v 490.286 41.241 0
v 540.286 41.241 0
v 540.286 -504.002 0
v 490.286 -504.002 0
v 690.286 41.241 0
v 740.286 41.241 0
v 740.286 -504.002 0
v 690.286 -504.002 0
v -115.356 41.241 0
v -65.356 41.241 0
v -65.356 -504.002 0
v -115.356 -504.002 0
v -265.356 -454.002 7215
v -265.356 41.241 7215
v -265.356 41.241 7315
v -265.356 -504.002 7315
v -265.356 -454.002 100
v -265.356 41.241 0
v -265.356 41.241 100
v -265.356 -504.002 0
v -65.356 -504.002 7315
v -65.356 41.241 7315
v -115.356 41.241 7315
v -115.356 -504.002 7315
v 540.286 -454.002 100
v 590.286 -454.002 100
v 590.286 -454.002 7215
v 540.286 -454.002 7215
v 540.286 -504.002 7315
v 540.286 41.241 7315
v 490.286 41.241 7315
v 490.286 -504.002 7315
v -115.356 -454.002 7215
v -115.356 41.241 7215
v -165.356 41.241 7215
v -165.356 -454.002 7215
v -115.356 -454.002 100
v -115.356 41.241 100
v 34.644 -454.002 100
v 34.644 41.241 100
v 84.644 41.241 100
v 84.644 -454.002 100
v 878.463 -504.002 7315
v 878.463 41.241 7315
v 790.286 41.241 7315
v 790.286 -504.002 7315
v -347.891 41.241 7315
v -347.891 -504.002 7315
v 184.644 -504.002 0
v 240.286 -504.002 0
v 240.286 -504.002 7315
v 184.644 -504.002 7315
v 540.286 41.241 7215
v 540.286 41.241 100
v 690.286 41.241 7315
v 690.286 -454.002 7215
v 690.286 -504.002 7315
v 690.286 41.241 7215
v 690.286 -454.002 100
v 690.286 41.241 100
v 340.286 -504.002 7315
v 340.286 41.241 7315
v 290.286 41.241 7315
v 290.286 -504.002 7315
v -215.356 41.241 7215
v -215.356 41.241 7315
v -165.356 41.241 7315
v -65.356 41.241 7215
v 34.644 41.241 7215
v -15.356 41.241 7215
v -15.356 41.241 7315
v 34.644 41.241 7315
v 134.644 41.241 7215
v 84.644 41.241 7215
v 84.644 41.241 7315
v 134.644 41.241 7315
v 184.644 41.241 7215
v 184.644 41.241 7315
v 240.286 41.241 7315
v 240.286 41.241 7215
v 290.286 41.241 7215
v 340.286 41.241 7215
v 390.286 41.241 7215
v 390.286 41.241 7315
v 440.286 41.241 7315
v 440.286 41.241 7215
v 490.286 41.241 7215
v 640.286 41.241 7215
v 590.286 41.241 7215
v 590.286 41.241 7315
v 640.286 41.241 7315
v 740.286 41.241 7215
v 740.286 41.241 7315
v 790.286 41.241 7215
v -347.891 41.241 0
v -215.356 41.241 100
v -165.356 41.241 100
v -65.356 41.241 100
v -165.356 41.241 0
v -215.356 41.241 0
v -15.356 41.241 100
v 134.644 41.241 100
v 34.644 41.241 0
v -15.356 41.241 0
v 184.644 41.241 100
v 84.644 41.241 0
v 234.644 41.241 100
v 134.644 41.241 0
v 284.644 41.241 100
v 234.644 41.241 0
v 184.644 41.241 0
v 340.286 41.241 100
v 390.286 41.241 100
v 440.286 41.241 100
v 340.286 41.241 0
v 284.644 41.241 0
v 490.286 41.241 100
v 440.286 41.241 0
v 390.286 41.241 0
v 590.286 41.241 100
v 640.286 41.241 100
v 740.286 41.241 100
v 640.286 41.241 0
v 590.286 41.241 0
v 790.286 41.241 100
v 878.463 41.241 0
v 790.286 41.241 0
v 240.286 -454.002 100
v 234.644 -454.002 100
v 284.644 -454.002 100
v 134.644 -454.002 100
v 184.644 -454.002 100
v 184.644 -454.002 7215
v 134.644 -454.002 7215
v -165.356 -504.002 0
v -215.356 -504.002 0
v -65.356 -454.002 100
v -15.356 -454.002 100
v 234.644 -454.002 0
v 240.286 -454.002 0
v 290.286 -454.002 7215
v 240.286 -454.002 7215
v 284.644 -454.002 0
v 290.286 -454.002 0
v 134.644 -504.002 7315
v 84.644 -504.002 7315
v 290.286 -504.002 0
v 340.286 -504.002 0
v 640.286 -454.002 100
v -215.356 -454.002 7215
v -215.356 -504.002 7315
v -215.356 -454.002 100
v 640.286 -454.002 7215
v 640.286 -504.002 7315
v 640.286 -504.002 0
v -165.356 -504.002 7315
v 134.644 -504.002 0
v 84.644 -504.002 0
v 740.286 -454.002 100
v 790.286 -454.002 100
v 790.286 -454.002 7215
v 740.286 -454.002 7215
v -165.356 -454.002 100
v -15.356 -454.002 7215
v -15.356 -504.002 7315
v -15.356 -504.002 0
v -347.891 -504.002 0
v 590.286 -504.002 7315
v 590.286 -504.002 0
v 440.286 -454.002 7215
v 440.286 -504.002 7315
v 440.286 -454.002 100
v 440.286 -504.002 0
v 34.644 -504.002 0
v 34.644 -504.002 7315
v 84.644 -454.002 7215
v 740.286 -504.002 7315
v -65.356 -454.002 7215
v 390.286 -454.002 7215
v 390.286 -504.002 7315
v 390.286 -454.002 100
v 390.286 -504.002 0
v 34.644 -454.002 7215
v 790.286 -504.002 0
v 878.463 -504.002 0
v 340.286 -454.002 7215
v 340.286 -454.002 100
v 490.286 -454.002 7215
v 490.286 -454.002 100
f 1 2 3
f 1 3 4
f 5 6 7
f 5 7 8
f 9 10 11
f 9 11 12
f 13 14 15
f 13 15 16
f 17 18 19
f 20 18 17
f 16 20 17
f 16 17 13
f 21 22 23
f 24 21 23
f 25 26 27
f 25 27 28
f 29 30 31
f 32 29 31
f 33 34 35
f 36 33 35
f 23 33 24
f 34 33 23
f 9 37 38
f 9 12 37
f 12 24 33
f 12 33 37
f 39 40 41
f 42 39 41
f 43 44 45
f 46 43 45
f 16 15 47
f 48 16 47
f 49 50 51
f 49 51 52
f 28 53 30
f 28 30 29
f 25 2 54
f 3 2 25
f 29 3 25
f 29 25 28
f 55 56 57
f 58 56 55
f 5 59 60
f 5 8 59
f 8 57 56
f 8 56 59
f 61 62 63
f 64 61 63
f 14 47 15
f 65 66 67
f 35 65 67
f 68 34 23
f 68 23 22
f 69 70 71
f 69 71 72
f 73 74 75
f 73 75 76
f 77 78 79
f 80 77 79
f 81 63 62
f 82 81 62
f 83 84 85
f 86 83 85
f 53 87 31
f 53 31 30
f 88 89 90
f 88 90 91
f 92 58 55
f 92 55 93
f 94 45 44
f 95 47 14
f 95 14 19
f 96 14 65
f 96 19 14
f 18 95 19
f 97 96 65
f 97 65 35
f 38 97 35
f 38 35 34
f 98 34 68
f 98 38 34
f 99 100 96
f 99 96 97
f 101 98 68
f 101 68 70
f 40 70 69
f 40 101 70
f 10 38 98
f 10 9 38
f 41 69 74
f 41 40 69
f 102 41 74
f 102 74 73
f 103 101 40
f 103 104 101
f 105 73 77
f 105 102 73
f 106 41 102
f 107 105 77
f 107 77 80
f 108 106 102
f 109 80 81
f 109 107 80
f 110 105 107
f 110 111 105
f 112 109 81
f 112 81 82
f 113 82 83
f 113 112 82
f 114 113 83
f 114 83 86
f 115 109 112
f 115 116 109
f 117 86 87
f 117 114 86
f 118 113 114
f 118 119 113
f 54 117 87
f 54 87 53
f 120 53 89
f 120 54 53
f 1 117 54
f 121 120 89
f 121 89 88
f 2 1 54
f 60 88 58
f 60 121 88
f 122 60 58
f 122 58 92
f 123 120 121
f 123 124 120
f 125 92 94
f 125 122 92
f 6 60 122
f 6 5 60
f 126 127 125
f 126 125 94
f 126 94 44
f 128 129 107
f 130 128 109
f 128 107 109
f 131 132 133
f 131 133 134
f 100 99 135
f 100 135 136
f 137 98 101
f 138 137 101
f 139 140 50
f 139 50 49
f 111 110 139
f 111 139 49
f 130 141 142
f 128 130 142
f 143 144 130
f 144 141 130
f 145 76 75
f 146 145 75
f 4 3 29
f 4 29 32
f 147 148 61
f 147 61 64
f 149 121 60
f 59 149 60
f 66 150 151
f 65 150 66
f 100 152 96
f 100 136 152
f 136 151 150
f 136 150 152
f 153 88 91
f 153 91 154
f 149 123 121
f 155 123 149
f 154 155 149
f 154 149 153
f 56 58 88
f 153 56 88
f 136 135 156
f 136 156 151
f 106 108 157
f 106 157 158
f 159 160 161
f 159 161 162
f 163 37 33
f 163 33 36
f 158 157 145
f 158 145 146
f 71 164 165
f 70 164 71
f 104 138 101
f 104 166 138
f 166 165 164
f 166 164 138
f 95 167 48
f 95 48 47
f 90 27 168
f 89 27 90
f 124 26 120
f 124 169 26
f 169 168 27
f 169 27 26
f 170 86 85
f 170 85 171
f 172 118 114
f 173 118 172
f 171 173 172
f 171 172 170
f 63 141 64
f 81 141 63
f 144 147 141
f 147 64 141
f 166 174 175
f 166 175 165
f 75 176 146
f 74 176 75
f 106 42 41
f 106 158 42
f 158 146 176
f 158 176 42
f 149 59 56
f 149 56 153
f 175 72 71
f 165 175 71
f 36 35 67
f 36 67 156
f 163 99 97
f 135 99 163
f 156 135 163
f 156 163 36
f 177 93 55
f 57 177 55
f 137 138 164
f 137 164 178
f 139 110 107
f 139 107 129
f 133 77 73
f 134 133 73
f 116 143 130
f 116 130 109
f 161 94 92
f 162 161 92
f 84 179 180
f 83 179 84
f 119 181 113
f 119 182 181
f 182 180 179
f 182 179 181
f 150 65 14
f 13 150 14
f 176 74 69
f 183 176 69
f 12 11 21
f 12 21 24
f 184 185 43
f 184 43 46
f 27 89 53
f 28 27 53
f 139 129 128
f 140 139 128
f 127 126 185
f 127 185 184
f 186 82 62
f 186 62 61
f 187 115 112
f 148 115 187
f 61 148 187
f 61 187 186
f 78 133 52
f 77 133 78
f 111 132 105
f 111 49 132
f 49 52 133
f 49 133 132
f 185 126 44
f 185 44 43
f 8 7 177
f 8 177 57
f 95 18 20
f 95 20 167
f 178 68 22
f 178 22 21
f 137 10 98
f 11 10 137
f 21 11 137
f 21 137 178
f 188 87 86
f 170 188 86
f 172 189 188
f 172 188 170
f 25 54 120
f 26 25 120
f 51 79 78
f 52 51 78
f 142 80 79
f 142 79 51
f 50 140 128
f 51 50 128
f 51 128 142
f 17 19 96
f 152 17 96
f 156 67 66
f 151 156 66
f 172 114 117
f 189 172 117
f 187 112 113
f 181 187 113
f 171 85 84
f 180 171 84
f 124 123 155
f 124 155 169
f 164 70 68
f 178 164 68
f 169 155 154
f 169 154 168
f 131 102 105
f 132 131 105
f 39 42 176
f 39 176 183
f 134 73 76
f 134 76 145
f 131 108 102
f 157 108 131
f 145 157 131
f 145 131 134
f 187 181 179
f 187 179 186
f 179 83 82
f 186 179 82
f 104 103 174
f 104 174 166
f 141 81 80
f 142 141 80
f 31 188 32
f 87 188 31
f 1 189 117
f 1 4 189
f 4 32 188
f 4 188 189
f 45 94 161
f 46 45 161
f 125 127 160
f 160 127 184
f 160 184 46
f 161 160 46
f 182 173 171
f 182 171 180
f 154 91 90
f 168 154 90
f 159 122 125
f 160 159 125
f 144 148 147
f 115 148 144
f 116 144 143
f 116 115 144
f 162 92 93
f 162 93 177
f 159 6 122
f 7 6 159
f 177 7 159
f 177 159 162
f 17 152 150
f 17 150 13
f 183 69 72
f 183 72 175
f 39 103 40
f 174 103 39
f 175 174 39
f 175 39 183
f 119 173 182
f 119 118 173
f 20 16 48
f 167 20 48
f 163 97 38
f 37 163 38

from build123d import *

# Parameters (mm, degrees)
BOSS_EXTRUDE1_DEPTH = 7315
CUT_EXTRUDE1_DEPTH  = 100
CUT_EXTRUDE2_DEPTH  = 100


with BuildPart() as part:
    # Sketch1 → Boss-Extrude1 (new body)
    with BuildSketch(Plane.XY):
        Polygon((390.286155145, -454.00220839), (340.286155145, -454.00220839), (340.286155145, -504.00220839), (290.286155145, -504.00220839), (290.286155145, -454.00220839), (240.286155145, -454.00220839), (240.286155145, -504.00220839), (184.64446635, -504.00220839), (184.64446635, -454.00220839), (134.64446635, -454.00220839), (134.64446635, -504.00220839), (84.64446635, -504.00220839), (84.64446635, -454.00220839), (34.64446635, -454.00220839), (34.64446635, -504.00220839), (-15.35553365, -504.00220839), (-15.35553365, -454.00220839), (-65.35553365, -454.00220839), (-65.35553365, -504.00220839), (-115.35553365, -504.00220839), (-115.35553365, -454.00220839), (-165.35553365, -454.00220839), (-165.35553365, -504.00220839), (-215.35553365, -504.00220839), (-215.35553365, -454.00220839), (-265.35553365, -454.00220839), (-265.35553365, -504.00220839), (-347.890991568, -504.00220839), (-347.890991568, 41.240606266), (878.463301858, 41.240606266), (878.463301858, -504.00220839), (790.286155145, -504.00220839), (790.286155145, -454.00220839), (740.286155145, -454.00220839), (740.286155145, -504.00220839), (690.286155145, -504.00220839), (690.286155145, -454.00220839), (640.286155145, -454.00220839), (640.286155145, -504.00220839), (590.286155145, -504.00220839), (590.286155145, -454.00220839), (540.286155145, -454.00220839), (540.286155145, -504.00220839), (490.286155145, -504.00220839), (490.286155145, -454.00220839), (440.286155145, -454.00220839), (440.286155145, -504.00220839), (390.286155145, -504.00220839), align=None)
    extrude(amount=BOSS_EXTRUDE1_DEPTH)

    # Sketch2 → Cut-Extrude1 (cut)
    with BuildSketch(Plane.XY.offset(7315)):
        Polygon((-265.35553365, -454.00220839), (-265.35553365, 201.707253547), (-265.35553365, 367.434180801), (790.286155145, 367.434180801), (790.286155145, -454.00220839), (740.286155145, -454.00220839), (740.286155145, 201.707253547), (690.286155145, 201.707253547), (690.286155145, -454.00220839), (640.286155145, -454.00220839), (640.286155145, 201.707253547), (590.286155145, 201.707253547), (590.286155145, -454.00220839), (540.286155145, -454.00220839), (540.286155145, 201.707253547), (490.286155145, 201.707253547), (490.286155145, -454.00220839), (440.286155145, -454.00220839), (440.286155145, 201.707253547), (390.286155145, 201.707253547), (390.286155145, -454.00220839), (340.286155145, -454.00220839), (340.286155145, 201.707253547), (290.286155145, 201.707253547), (290.286155145, -454.00220839), (240.286155145, -454.00220839), (240.286155145, 201.707253547), (184.64446635, 201.707253547), (184.64446635, -454.00220839), (134.64446635, -454.00220839), (134.64446635, 201.707253547), (84.64446635, 201.707253547), (84.64446635, -454.00220839), (34.64446635, -454.00220839), (34.64446635, 201.707253547), (-15.35553365, 201.707253547), (-15.35553365, -454.00220839), (-65.35553365, -454.00220839), (-65.35553365, 201.707253547), (-115.35553365, 201.707253547), (-115.35553365, -454.00220839), (-165.35553365, -454.00220839), (-165.35553365, 201.707253547), (-215.35553365, 201.707253547), (-215.35553365, -454.00220839), align=None)
    extrude(amount=-CUT_EXTRUDE1_DEPTH, mode=Mode.SUBTRACT)

    # Sketch3 → Cut-Extrude2 (cut)
    with BuildSketch(Plane(origin=(0, 0, 0), x_dir=(-1, 0, 0), z_dir=(0, 0, -1))):
        Polygon((-790.286155145, -454.00220839), (-790.286155145, 201.707253547), (-790.286155145, 367.434180801), (265.35553365, 367.434180801), (265.35553365, -454.00220839), (215.35553365, -454.00220839), (215.35553365, 201.707253547), (165.35553365, 201.707253547), (165.35553365, -454.00220839), (115.35553365, -454.00220839), (115.35553365, 201.707253547), (65.35553365, 201.707253547), (65.35553365, -454.00220839), (15.35553365, -454.00220839), (15.35553365, 201.707253547), (-34.64446635, 201.707253547), (-34.64446635, -454.00220839), (-84.64446635, -454.00220839), (-84.64446635, 201.707253547), (-134.64446635, 201.707253547), (-134.64446635, -454.00220839), (-184.64446635, -454.00220839), (-184.64446635, 201.707253547), (-234.64446635, 201.707253547), (-234.64446635, -454.00220839), (-284.64446635, -454.00220839), (-284.64446635, 201.707253547), (-340.286155145, 201.707253547), (-340.286155145, -454.00220839), (-390.286155145, -454.00220839), (-390.286155145, 201.707253547), (-440.286155145, 201.707253547), (-440.286155145, -454.00220839), (-490.286155145, -454.00220839), (-490.286155145, 201.707253547), (-540.286155145, 201.707253547), (-540.286155145, -454.00220839), (-590.286155145, -454.00220839), (-590.286155145, 201.707253547), (-640.286155145, 201.707253547), (-640.286155145, -454.00220839), (-690.286155145, -454.00220839), (-690.286155145, 201.707253547), (-740.286155145, 201.707253547), (-740.286155145, -454.00220839), align=None)
    extrude(amount=-CUT_EXTRUDE2_DEPTH, mode=Mode.SUBTRACT)


solid = part.part
